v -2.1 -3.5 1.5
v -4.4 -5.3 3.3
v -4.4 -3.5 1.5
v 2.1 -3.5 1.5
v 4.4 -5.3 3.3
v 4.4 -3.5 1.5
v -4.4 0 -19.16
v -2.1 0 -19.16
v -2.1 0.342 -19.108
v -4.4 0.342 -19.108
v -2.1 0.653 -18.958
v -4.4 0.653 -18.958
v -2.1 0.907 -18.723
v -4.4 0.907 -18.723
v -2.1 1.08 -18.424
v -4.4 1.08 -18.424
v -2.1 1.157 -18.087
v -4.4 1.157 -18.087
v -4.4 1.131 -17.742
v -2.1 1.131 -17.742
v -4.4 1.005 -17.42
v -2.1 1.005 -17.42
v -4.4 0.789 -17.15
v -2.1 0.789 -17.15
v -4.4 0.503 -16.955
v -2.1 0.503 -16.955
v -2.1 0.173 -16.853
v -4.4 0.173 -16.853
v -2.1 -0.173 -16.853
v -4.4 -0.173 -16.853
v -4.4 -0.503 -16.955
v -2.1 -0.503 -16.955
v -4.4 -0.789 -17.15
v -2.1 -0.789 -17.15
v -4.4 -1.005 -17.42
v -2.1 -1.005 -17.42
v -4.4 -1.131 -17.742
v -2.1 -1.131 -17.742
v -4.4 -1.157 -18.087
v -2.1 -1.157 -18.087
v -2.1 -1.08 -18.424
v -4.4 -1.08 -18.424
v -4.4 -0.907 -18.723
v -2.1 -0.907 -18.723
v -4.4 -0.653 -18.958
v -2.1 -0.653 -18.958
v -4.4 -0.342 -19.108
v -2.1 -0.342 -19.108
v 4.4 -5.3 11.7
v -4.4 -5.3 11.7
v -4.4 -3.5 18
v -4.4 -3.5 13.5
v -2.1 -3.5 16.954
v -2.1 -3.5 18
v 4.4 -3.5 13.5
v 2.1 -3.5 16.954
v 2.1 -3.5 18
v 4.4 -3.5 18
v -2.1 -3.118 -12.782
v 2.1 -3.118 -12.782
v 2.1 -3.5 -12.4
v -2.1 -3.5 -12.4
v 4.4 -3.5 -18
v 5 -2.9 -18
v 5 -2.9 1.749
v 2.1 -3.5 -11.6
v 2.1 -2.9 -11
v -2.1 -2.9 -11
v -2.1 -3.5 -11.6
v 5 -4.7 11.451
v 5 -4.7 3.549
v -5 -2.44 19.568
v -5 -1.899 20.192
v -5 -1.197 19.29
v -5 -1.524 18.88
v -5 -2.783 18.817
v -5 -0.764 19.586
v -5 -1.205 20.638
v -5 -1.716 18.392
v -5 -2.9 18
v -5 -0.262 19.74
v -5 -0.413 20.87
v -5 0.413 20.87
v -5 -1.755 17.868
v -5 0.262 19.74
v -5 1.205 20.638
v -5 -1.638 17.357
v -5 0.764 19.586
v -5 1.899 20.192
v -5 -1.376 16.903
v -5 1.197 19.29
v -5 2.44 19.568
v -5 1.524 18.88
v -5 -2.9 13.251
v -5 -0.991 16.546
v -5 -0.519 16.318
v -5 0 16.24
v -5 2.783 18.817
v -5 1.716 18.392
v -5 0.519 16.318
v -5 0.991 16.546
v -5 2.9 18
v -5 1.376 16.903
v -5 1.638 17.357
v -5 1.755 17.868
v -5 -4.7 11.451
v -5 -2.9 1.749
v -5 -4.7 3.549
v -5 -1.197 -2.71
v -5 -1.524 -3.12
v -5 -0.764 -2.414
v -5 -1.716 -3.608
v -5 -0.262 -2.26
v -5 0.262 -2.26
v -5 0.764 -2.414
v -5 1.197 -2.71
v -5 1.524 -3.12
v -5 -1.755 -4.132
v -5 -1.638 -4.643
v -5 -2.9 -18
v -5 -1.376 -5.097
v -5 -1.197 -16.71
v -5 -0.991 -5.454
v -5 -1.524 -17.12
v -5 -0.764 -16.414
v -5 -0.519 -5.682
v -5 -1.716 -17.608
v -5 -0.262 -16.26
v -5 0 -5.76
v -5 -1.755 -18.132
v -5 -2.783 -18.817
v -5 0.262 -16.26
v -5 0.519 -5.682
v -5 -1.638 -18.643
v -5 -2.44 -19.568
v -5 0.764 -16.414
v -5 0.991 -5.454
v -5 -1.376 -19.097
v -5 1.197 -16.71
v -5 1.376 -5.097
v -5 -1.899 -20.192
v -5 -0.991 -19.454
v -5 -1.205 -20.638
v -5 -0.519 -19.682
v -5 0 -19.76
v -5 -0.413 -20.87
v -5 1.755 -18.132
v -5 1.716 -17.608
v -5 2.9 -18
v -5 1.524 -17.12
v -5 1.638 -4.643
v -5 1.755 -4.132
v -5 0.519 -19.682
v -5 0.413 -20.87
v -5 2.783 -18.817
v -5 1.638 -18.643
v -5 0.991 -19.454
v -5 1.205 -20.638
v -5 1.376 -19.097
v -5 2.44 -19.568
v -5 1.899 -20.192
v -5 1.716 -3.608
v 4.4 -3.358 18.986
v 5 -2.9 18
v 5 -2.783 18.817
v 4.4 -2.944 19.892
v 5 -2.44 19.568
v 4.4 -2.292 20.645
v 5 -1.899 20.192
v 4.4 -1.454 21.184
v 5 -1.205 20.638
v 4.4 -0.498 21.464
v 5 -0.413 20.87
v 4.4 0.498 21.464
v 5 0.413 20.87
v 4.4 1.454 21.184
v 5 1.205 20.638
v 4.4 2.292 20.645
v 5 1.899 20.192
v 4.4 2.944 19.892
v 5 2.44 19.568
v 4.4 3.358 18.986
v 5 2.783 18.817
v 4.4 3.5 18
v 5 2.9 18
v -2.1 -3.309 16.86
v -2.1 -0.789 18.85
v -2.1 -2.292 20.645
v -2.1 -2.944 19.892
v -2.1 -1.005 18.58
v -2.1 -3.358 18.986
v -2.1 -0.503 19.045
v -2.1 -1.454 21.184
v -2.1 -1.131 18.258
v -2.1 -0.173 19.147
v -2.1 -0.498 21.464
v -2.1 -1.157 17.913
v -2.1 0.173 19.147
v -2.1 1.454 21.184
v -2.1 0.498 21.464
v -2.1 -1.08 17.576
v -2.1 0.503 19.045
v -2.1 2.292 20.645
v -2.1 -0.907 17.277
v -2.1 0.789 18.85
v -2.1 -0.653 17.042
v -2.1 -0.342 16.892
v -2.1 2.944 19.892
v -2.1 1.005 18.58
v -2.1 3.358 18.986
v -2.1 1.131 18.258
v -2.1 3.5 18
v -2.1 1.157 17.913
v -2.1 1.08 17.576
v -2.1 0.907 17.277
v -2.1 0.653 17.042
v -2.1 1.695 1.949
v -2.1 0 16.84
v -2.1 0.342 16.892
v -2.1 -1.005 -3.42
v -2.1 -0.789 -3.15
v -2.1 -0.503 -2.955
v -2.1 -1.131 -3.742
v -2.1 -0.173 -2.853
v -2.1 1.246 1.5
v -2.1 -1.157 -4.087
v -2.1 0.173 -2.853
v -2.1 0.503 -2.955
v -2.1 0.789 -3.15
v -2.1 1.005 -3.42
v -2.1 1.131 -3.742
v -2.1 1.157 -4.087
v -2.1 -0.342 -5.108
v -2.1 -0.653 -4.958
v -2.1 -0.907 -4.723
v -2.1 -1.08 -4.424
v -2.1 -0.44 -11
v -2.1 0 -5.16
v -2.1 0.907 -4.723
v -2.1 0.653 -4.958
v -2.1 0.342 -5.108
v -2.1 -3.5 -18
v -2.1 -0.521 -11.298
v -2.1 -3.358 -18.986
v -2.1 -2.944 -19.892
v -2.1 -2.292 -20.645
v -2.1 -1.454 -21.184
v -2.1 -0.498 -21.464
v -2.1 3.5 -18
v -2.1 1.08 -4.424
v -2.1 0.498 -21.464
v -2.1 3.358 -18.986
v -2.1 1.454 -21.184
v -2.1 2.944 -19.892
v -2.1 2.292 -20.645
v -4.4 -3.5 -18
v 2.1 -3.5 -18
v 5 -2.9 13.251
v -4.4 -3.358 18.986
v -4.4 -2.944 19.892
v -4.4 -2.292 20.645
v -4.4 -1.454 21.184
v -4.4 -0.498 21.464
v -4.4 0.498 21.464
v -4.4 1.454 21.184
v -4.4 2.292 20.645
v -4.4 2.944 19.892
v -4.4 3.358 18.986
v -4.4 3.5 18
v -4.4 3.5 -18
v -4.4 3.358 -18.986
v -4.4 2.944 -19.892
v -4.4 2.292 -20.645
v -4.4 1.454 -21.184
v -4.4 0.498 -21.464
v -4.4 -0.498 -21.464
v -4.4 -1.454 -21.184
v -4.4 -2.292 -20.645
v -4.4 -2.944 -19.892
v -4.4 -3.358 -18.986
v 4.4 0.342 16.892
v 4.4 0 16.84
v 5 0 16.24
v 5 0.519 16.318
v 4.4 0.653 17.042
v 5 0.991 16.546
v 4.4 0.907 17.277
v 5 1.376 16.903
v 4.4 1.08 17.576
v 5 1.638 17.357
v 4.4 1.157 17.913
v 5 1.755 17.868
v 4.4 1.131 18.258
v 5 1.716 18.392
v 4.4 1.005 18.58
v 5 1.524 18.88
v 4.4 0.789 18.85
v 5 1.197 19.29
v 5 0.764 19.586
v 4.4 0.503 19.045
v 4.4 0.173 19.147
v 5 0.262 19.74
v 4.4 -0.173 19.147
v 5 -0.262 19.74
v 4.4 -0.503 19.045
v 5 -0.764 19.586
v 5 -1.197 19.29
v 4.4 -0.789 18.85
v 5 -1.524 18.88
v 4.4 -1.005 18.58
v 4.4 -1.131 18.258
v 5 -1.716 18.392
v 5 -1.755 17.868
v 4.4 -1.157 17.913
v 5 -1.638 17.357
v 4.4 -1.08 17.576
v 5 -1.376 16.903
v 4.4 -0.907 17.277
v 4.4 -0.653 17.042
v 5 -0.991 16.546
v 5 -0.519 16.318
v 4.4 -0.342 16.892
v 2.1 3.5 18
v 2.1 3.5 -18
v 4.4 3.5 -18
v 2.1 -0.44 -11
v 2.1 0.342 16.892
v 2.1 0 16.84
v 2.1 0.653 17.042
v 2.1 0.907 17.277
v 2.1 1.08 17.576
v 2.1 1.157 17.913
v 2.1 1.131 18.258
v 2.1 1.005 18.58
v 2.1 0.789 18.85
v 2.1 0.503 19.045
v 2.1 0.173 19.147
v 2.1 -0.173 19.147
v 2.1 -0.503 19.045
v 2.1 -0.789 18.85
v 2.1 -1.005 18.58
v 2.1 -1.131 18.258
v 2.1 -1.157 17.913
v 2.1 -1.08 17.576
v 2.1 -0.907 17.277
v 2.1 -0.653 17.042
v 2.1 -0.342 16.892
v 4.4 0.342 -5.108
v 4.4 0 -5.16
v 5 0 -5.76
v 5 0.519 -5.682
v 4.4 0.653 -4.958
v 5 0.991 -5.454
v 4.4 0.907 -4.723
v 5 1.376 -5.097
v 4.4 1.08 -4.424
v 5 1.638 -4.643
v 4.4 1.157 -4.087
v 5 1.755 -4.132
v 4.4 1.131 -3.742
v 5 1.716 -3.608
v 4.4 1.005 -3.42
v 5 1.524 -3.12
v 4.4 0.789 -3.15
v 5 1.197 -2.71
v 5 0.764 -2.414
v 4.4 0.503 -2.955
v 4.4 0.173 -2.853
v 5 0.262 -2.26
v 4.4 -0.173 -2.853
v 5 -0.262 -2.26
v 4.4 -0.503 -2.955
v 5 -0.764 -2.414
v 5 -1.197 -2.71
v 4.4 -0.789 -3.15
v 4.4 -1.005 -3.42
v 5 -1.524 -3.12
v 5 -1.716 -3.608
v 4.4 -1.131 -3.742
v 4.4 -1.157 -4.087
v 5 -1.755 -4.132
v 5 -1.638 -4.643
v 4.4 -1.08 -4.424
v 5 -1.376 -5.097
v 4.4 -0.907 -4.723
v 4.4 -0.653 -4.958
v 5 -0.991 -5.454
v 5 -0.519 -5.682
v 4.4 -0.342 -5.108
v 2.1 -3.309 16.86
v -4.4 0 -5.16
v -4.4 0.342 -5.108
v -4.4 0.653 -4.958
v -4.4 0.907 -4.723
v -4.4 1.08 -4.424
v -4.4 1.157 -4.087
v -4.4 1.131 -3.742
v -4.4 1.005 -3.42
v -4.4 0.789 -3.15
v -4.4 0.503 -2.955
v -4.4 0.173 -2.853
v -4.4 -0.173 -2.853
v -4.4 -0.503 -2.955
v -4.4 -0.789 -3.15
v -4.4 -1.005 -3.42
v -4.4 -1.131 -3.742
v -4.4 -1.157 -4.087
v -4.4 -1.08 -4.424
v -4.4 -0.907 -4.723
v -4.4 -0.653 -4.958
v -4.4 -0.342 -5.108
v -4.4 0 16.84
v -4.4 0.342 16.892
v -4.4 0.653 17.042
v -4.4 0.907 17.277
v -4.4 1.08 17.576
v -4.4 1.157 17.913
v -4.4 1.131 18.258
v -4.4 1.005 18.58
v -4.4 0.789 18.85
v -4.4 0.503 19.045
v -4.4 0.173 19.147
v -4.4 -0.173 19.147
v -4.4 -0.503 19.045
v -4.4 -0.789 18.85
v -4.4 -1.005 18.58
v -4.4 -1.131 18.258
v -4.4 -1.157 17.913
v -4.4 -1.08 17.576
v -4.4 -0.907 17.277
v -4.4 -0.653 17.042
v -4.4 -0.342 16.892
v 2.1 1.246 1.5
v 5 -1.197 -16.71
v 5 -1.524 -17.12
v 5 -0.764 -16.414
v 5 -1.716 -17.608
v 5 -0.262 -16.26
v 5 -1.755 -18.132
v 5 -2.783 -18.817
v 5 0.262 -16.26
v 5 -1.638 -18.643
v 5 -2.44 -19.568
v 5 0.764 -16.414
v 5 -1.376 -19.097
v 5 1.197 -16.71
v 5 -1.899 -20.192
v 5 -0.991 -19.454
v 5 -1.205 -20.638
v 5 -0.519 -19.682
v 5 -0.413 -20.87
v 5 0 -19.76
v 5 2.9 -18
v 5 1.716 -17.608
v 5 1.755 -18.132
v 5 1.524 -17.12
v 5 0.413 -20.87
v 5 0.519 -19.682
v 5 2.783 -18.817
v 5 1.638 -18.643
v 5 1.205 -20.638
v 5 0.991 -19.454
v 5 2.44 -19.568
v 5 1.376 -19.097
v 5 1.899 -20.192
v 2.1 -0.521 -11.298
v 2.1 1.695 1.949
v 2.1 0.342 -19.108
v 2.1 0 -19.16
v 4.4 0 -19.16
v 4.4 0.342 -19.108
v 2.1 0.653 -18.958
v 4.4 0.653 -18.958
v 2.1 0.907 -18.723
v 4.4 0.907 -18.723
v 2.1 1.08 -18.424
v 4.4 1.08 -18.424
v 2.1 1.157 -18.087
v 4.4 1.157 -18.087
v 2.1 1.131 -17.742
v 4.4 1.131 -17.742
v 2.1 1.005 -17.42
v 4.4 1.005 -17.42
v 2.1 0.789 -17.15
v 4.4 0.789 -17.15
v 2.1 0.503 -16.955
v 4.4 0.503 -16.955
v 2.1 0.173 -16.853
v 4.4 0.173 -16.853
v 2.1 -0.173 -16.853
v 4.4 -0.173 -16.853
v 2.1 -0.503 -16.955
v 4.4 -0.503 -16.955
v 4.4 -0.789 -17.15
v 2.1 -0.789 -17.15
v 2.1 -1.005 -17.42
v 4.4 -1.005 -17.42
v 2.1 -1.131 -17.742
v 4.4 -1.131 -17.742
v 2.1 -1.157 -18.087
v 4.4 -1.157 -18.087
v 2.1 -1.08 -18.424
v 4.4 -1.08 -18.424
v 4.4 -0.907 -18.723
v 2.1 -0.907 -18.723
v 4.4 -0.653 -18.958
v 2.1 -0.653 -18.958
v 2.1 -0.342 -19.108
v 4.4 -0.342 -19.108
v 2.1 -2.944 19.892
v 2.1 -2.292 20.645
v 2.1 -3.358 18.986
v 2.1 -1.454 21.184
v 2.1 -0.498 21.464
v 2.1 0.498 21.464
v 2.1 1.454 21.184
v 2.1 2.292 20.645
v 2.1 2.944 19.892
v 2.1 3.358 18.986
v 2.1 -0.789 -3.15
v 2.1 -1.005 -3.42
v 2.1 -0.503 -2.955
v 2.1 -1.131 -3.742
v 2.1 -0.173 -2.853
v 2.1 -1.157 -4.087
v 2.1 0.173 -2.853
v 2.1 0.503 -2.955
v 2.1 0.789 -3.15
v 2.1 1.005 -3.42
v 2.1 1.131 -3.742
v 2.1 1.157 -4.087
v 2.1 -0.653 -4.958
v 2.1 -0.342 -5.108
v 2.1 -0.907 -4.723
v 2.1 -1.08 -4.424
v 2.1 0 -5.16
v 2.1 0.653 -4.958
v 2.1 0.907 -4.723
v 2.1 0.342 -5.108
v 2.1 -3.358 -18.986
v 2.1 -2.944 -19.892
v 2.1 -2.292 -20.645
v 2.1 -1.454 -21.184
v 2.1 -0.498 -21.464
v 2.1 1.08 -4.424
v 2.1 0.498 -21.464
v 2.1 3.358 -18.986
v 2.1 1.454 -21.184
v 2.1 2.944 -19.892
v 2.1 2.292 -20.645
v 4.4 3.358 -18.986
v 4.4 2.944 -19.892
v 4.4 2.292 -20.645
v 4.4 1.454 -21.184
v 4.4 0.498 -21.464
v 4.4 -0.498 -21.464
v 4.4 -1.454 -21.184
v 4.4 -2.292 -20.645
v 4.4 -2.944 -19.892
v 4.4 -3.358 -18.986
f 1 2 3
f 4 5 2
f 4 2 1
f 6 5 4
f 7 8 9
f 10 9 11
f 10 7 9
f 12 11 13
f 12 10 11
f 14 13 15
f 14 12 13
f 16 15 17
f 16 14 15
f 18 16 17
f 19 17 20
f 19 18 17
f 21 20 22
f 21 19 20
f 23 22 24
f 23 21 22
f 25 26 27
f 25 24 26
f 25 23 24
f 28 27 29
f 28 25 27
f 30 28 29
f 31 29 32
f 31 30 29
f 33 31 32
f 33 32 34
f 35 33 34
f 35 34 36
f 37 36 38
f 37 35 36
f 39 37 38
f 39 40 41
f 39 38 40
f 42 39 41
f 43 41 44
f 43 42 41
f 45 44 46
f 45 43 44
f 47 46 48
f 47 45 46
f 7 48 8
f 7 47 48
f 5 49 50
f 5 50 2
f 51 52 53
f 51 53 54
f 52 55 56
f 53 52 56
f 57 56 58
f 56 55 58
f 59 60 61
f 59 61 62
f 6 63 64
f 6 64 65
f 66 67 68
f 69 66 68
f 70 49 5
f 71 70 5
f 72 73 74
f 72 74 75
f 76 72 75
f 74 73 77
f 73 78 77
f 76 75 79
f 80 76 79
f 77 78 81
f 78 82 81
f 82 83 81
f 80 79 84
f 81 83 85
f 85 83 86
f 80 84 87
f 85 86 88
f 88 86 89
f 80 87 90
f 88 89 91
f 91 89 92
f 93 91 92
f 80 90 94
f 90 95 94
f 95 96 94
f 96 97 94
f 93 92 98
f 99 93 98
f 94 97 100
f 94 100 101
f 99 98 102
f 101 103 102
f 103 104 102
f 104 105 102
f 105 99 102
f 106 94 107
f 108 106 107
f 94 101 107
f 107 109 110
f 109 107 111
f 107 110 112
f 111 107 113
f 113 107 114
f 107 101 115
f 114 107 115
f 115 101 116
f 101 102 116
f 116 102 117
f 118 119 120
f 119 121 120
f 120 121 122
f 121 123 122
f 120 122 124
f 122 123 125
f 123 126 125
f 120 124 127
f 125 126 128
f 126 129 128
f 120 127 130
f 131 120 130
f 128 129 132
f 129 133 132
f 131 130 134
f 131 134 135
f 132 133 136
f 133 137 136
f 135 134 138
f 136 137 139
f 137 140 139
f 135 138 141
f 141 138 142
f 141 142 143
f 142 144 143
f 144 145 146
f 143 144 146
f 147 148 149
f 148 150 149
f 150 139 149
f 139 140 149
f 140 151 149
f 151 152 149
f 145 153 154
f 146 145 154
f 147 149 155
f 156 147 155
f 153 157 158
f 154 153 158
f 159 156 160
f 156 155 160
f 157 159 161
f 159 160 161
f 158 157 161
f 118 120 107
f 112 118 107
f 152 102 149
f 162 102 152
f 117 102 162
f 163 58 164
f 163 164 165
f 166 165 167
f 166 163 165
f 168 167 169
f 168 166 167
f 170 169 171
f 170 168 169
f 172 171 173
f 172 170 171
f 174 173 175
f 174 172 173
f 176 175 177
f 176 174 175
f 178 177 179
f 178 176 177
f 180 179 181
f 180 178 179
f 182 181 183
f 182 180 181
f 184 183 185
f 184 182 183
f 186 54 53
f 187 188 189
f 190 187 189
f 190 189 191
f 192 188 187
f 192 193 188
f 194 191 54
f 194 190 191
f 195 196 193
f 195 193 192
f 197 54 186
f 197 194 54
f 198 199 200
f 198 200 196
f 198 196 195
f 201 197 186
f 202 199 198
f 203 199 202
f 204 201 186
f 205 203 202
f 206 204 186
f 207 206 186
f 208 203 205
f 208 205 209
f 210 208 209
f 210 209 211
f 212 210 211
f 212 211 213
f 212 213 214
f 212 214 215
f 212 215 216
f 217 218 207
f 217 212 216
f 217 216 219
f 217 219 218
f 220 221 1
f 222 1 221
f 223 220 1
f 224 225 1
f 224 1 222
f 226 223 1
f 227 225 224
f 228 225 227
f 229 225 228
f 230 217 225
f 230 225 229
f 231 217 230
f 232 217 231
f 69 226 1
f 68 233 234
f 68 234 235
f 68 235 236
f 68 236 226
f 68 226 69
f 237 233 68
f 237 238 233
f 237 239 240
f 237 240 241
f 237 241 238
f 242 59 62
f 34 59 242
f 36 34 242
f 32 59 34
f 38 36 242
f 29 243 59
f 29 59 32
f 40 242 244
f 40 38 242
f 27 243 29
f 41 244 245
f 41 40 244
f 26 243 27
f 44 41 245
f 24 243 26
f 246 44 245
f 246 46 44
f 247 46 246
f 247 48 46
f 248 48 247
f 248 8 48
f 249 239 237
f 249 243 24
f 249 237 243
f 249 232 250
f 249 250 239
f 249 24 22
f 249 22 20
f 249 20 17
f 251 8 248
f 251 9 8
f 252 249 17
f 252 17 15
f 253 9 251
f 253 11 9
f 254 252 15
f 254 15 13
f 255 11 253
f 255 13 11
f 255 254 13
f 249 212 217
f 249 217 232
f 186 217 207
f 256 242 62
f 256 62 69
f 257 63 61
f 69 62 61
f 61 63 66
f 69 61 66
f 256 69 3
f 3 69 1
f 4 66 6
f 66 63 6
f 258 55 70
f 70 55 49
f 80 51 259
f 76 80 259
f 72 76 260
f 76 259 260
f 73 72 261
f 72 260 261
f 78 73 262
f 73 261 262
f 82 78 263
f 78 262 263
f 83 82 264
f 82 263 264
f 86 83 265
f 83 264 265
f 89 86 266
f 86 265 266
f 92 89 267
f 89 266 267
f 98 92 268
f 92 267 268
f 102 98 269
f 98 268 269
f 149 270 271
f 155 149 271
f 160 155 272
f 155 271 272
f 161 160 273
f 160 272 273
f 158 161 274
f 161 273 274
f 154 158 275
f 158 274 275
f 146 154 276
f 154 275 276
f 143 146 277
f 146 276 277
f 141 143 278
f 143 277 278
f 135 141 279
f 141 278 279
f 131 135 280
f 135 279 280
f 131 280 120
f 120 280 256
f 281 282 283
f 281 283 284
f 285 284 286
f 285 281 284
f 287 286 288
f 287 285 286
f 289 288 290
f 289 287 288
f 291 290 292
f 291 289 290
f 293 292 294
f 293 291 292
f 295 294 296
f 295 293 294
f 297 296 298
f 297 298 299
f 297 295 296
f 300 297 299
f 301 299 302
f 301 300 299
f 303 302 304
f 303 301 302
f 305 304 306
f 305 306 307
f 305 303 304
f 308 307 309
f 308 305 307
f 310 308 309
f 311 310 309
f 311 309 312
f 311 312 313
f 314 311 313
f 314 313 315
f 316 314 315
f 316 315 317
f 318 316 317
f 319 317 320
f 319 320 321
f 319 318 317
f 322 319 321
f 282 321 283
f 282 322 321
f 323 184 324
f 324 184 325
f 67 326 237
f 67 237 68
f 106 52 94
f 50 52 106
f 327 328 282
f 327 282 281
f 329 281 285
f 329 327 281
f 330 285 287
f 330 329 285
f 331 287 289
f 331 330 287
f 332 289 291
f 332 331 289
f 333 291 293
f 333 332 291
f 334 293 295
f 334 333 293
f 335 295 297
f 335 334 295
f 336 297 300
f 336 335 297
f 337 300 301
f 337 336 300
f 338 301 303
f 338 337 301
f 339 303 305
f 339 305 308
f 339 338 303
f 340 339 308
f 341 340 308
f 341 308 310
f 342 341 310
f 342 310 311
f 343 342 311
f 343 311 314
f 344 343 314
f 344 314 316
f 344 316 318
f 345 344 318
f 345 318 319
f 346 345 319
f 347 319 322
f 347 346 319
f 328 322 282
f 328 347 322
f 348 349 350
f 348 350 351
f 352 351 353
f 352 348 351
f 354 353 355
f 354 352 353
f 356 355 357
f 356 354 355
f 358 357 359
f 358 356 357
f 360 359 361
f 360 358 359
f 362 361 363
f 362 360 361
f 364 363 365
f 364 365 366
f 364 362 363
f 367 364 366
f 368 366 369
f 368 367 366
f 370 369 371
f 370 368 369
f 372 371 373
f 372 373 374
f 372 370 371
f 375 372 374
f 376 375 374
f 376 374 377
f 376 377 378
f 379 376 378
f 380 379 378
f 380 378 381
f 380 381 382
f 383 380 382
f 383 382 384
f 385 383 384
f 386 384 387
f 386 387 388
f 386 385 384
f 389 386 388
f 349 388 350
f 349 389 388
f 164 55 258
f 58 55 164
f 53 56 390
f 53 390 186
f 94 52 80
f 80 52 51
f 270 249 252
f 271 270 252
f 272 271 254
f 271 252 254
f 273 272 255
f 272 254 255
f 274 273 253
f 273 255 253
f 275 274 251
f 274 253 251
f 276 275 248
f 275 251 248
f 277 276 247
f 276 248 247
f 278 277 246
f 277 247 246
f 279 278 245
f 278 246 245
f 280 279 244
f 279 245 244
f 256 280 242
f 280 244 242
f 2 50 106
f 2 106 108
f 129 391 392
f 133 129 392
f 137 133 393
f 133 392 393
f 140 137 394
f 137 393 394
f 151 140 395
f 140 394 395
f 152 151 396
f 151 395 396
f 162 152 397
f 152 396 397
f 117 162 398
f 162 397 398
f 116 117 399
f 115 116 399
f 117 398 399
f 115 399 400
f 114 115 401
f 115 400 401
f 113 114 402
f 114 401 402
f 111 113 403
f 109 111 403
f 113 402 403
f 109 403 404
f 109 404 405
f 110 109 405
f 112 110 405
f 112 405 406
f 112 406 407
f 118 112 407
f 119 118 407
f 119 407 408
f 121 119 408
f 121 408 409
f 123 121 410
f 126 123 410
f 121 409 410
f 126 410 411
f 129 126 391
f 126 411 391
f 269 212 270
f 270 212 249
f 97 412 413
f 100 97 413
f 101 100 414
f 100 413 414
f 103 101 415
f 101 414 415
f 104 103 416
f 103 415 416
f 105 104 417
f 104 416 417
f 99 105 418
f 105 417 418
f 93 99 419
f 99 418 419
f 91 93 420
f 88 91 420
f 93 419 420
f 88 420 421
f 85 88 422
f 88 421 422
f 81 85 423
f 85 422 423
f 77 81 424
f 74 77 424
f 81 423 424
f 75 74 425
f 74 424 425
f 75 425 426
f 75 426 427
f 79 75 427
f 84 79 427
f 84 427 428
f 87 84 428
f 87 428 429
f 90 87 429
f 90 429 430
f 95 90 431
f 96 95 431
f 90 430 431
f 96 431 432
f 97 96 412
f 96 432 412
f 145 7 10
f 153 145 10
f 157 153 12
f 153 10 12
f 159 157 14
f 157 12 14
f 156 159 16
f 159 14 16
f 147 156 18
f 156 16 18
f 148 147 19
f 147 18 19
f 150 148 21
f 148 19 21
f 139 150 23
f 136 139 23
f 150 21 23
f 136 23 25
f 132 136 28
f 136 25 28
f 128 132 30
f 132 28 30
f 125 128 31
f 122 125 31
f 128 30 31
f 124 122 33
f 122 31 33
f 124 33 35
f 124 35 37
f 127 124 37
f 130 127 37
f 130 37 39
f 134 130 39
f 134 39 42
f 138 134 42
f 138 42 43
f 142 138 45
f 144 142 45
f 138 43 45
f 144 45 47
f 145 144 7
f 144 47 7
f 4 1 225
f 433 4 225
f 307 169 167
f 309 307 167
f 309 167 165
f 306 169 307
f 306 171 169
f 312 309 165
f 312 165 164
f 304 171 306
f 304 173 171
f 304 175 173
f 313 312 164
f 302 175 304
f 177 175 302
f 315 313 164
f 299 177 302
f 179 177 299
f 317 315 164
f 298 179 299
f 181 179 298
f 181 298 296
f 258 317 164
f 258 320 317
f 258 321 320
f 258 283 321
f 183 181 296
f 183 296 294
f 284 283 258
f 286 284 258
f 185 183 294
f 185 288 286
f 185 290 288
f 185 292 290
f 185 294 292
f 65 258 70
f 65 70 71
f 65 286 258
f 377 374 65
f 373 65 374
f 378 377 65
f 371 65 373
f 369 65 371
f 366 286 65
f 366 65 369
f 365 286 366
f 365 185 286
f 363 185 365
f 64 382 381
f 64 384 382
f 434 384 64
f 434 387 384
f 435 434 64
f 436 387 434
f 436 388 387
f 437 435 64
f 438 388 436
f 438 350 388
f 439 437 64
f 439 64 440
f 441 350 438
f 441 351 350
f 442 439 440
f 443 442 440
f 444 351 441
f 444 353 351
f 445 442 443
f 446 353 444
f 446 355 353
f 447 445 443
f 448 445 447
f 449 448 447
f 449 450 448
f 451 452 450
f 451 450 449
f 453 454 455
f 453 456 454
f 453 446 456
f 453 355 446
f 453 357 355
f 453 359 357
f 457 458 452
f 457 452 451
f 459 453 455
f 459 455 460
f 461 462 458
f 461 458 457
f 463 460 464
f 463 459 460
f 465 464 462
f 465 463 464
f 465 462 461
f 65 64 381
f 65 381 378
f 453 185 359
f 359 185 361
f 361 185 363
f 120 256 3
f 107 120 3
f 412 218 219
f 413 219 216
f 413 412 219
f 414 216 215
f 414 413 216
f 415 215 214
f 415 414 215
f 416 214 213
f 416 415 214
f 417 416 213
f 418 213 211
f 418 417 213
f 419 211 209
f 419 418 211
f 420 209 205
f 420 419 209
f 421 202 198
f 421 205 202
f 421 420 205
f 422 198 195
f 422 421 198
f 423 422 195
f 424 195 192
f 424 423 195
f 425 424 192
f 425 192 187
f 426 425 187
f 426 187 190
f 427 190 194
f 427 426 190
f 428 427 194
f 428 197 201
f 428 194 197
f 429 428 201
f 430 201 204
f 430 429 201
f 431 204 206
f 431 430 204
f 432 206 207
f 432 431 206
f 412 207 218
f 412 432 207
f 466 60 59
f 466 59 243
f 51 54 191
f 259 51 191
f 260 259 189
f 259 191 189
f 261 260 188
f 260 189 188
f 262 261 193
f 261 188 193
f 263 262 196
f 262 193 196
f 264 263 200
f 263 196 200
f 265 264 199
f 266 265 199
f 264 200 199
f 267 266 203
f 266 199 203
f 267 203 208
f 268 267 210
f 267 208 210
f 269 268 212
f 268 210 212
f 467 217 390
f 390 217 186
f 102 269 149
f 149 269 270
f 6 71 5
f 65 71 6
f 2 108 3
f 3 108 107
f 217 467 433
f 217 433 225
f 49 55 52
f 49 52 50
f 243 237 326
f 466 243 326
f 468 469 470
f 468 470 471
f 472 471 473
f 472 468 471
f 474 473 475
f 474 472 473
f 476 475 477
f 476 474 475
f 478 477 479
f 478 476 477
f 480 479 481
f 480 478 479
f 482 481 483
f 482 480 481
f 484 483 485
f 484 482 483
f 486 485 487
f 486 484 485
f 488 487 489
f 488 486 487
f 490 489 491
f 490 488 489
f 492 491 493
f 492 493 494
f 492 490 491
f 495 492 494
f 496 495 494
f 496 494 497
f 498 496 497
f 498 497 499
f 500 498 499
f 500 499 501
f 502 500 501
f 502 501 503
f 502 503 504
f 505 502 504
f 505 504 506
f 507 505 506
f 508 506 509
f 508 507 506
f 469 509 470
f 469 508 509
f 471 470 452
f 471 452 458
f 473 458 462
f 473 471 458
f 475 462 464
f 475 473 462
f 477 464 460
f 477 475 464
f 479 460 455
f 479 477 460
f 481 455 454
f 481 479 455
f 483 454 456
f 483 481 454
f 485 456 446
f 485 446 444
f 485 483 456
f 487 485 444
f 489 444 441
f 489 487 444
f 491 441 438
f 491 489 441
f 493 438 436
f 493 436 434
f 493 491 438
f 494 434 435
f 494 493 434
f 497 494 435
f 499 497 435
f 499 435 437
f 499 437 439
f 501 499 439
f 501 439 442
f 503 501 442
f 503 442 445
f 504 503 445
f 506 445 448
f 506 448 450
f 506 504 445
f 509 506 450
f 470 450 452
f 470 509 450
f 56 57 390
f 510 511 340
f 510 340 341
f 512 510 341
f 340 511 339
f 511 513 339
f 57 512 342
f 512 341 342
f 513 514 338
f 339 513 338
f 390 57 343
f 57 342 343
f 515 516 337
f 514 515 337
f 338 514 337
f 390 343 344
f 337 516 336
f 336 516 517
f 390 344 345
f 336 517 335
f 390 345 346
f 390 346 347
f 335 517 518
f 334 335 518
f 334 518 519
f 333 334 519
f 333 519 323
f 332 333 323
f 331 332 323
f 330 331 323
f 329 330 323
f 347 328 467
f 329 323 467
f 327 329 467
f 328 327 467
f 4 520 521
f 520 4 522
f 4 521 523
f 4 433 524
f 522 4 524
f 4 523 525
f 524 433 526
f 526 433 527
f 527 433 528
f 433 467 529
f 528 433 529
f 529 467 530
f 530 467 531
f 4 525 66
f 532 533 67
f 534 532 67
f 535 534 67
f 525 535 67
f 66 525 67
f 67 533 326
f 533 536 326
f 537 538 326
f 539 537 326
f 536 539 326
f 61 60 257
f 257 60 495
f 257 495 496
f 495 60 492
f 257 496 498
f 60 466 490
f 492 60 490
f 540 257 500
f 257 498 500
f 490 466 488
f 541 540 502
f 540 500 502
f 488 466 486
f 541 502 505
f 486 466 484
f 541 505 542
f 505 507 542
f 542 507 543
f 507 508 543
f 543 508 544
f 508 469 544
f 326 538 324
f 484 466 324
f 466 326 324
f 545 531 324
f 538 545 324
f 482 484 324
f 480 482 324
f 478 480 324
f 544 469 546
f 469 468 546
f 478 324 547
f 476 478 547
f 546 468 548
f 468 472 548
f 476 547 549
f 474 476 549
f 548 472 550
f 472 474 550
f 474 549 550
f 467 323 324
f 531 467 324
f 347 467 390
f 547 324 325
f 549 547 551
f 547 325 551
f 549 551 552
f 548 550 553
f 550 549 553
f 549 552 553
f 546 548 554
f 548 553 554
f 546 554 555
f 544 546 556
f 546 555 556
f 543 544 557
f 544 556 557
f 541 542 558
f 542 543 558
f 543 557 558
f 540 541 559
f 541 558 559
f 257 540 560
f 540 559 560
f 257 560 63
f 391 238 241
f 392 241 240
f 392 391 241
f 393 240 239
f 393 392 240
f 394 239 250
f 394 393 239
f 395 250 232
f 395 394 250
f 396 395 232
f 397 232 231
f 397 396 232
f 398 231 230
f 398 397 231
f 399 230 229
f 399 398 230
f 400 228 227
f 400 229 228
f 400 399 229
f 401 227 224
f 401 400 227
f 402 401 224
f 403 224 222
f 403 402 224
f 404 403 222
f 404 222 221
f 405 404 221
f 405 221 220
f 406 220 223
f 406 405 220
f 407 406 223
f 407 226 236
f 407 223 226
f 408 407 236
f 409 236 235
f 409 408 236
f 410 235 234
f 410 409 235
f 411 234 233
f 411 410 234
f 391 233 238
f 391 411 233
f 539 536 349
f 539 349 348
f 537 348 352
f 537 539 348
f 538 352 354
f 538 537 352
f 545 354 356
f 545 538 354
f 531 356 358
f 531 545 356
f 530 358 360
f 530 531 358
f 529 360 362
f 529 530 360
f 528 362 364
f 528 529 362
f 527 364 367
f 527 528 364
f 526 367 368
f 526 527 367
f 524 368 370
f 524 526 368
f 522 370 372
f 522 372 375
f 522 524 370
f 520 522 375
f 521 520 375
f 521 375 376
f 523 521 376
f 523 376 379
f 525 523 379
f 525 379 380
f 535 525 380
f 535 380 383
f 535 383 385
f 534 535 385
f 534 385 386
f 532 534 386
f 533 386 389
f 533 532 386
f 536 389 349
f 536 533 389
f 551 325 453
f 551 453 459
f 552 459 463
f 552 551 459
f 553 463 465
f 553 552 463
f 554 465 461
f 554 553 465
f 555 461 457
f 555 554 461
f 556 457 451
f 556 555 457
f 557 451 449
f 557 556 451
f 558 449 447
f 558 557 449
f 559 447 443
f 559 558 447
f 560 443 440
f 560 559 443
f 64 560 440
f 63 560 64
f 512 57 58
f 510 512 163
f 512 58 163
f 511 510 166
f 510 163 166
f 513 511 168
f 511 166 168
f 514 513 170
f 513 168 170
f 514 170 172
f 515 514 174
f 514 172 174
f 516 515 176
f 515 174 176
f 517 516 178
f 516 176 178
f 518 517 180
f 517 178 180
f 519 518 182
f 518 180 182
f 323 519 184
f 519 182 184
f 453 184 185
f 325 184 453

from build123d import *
from OCP.BRepFilletAPI import BRepFilletAPI_MakeChamfer

# Parameters (mm, degrees)
SKETCH_1_R          = 1.16
EXTRUDE_1_DEPTH     = 5
CUT_EXTRUDE_1_DEPTH = 2.1
EXTRUDE_2_DEPTH     = 2.5
EXTRUDE_3_DEPTH     = 5
CHAMFER_2_SIZE      = 0.6
CHAMFER_2_SIZE2     = 0.4738544759401763
CHAMFER_2_SIZE2_2   = 0.4738544759401755
CHAMFER_2_SIZE2_3   = 0.4397595135435583
CHAMFER_2_SIZE2_4   = 0.43975951354355786


with BuildPart() as part:
    # 草图1 → 凸台-拉伸1 (new, symmetric)
    with BuildSketch(Plane(origin=(0, 0, 0), x_dir=(0, 0, -1), z_dir=(1, 0, 0))):
        with BuildLine():
            Line((-18.000000000000004, 3.500000000000003), (18.000000000000004, 3.500000000000003))
            ThreePointArc((18.000000000000004, 3.500000000000003), (21.50000000000001, 3.31e-15), (18.000000000000004, -3.500000000000003))
            Line((18.000000000000004, -3.500000000000003), (-18.000000000000004, -3.500000000000003))
            ThreePointArc((-18.000000000000004, -3.500000000000003), (-21.500000000000004, 3.74e-15), (-18.000000000000004, 3.500000000000003))
        make_face()
        with Locations((18.000000000000004, 3.31e-15)):
            Circle(SKETCH_1_R, mode=Mode.SUBTRACT)
        with Locations((4, -2.2e-15)):
            Circle(SKETCH_1_R, mode=Mode.SUBTRACT)
        with Locations((-18.000000000000004, 3.31e-15)):
            Circle(SKETCH_1_R, mode=Mode.SUBTRACT)
    extrude(amount=EXTRUDE_1_DEPTH, both=True)

    # 草图2 → 切除-拉伸1 (cut, symmetric)
    with BuildSketch(Plane(origin=(0, 0, 0), x_dir=(0, 0, -1), z_dir=(1, 0, 0))):
        with BuildLine():
            Line((-18.000000000000004, -3.4999999999999996), (18.000000000000004, -3.4999999999999996))
            ThreePointArc((18.000000000000004, -3.4999999999999996), (21.500000000000007, 3.31e-15), (18.000000000000004, 3.500000000000005))
            Line((18.000000000000004, 3.500000000000005), (-18.000000000000004, 3.5000000000000067))
            ThreePointArc((-18.000000000000004, 3.5000000000000067), (-21.500000000000007, 3.74e-15), (-18.000000000000004, -3.4999999999999996))
        make_face()
    extrude(amount=CUT_EXTRUDE_1_DEPTH, both=True, mode=Mode.SUBTRACT)


with BuildPart() as cut_extrude_1_piece_1:
    # of the separate pieces the step leaves, piece 1, a body of its own (cut_extrude_1_pieces)
    add(part.part.solids().sort_by_distance((-5, 3.5, 18))[0])



with BuildPart() as cut_extrude_1_piece_2:
    # of the separate pieces the step leaves, piece 2, a body of its own (cut_extrude_1_pieces)
    add(part.part.solids().sort_by_distance((2.1, 3.5, 18))[0])


with BuildPart() as cut_extrude_1_piece_1_1:
    add(cut_extrude_1_piece_1.part)

    add(cut_extrude_1_piece_2.part)  # 凸台-拉伸2 merges 切除-拉伸1 piece 2
    # 草图2<4> → 凸台-拉伸2 (add, symmetric)
    with BuildSketch(Plane(origin=(0, 0, 0), x_dir=(0, 0, -1), z_dir=(1, 0, 0))):
        Polygon((-16.886363638073764, -3.3181039847171285), (-17.42832680730712, -3.500000000000003), (-1.5000000000000036, -3.4999999999999996), (-1.5000000000000053, 1.8459337107187295), align=None)
        Polygon((13.000000000000002, -3.5000000000000013), (11.000000000000002, -8.6e-16), (11.000000000000004, -3.4999999999999996), align=None)
    extrude(amount=EXTRUDE_2_DEPTH, both=True)

    # 草图3 → 凸台-拉伸3 (add, symmetric)
    with BuildSketch(Plane(origin=(0, 0, 0), x_dir=(0, 0, -1), z_dir=(1, 0, 0))):
        Polygon((-1.5000000000000049, -3.4999999999999996), (-13.500000000000005, -3.5000000000000027), (-11.699999999999978, -5.3000000000000025), (-3.3000000000000287, -5.300000000000003), align=None)
    extrude(amount=EXTRUDE_3_DEPTH, both=True)

    # 倒角2: one chamfer whose edges measure the first distance from different faces: ONE call of the kernel's chamfer builder (chamfer() names one face for all edges)
    chamfer_2_edges_1 = [cut_extrude_1_piece_1_1.edges().sort_by_distance(p)[0] for p in [
        (-5, -4.4e-16, 21.500000000000004),
        (-5, -3.500000000000003, 15.750000000000004),
        (-5, -1.2e-16, -21.50000000000001),
        (-5, 3.500000000000003, 0),
        (-5, 3.45e-15, -16.840000000000003),
        (-5, -2.06e-15, -2.84),
        (-5, 3.45e-15, 19.160000000000004),
        (5, 3.45e-15, -16.840000000000003),
        (5, -2.06e-15, -2.84),
        (5, -4.4e-16, 21.500000000000004),
        (5, -3.500000000000003, 15.750000000000004),
        (5, -1.2e-16, -21.50000000000001),
        (5, 3.500000000000003, 0),
        (5, 3.45e-15, 19.160000000000004),
        (4.4e-16, -3.4999999999999996, -11.000000000000004),
        (5, -3.500000000000003, -8.25),
        (-5, -3.500000000000003, -8.25),
        (-5, -4.400000000000002, 12.59999999999999),
        (-5, -5.3000000000000025, 7.5000000000000036),
        (-5, -4.400000000000001, 2.400000000000017),
        (5, -4.400000000000002, 12.59999999999999),
        (5, -5.3000000000000025, 7.5000000000000036),
        (5, -4.400000000000001, 2.400000000000017),
    ]]
    chamfer_2_edges_2 = [cut_extrude_1_piece_1_1.edges().sort_by_distance(p)[0] for p in [
        (4.4e-16, 1.8459337107187292, 1.5000000000000053),
    ]]
    chamfer_2_side_2 = [cut_extrude_1_piece_1_1.faces().sort_by_distance(p)[0] for p in [
        (1e-17, -0.827033144640636, 1.500000000000005),
    ]]
    chamfer_2_edges_3 = [cut_extrude_1_piece_1_1.edges().sort_by_distance(p)[0] for p in [
        (4.4e-16, -3.5000000000000013, 17.42832680730712),
    ]]
    chamfer_2_side_3 = [cut_extrude_1_piece_1_1.faces().sort_by_distance(p)[0] for p in [
        (-2e-17, -0.8270331446406359, 9.464163403653561),
    ]]
    chamfer_2_edges_4 = [cut_extrude_1_piece_1_1.edges().sort_by_distance(p)[0] for p in [
        (4.4e-16, -3.5000000000000013, -13.000000000000002),
    ]]
    chamfer_2_side_4 = [cut_extrude_1_piece_1_1.faces().sort_by_distance(p)[0] for p in [
        (4.780853929991888, -3.500000000000003, -8.25),
    ]]
    chamfer_2_edges_5 = [cut_extrude_1_piece_1_1.edges().sort_by_distance(p)[0] for p in [
        (-4.4e-16, -8.6e-16, -11.000000000000002),
    ]]
    chamfer_2_side_5 = [cut_extrude_1_piece_1_1.faces().sort_by_distance(p)[0] for p in [
        (-1e-17, -1.7500000000000009, -12.000000000000002),
    ]]
    chamfer_2 = BRepFilletAPI_MakeChamfer(cut_extrude_1_piece_1_1.part.solid().wrapped)
    for e in chamfer_2_edges_1:
        chamfer_2.Add(CHAMFER_2_SIZE, e.wrapped)
    for e in chamfer_2_edges_2:
        chamfer_2.Add(CHAMFER_2_SIZE, CHAMFER_2_SIZE2, e.wrapped, chamfer_2_side_2[0].wrapped)  # the first distance lies on this face
    for e in chamfer_2_edges_3:
        chamfer_2.Add(CHAMFER_2_SIZE, CHAMFER_2_SIZE2_2, e.wrapped, chamfer_2_side_3[0].wrapped)  # the first distance lies on this face
    for e in chamfer_2_edges_4:
        chamfer_2.Add(CHAMFER_2_SIZE, CHAMFER_2_SIZE2_3, e.wrapped, chamfer_2_side_4[0].wrapped)  # the first distance lies on this face
    for e in chamfer_2_edges_5:
        chamfer_2.Add(CHAMFER_2_SIZE, CHAMFER_2_SIZE2_4, e.wrapped, chamfer_2_side_5[0].wrapped)  # the first distance lies on this face
    add(Compound.cast(chamfer_2.Shape()), mode=Mode.REPLACE)


solid = cut_extrude_1_piece_1_1.part
